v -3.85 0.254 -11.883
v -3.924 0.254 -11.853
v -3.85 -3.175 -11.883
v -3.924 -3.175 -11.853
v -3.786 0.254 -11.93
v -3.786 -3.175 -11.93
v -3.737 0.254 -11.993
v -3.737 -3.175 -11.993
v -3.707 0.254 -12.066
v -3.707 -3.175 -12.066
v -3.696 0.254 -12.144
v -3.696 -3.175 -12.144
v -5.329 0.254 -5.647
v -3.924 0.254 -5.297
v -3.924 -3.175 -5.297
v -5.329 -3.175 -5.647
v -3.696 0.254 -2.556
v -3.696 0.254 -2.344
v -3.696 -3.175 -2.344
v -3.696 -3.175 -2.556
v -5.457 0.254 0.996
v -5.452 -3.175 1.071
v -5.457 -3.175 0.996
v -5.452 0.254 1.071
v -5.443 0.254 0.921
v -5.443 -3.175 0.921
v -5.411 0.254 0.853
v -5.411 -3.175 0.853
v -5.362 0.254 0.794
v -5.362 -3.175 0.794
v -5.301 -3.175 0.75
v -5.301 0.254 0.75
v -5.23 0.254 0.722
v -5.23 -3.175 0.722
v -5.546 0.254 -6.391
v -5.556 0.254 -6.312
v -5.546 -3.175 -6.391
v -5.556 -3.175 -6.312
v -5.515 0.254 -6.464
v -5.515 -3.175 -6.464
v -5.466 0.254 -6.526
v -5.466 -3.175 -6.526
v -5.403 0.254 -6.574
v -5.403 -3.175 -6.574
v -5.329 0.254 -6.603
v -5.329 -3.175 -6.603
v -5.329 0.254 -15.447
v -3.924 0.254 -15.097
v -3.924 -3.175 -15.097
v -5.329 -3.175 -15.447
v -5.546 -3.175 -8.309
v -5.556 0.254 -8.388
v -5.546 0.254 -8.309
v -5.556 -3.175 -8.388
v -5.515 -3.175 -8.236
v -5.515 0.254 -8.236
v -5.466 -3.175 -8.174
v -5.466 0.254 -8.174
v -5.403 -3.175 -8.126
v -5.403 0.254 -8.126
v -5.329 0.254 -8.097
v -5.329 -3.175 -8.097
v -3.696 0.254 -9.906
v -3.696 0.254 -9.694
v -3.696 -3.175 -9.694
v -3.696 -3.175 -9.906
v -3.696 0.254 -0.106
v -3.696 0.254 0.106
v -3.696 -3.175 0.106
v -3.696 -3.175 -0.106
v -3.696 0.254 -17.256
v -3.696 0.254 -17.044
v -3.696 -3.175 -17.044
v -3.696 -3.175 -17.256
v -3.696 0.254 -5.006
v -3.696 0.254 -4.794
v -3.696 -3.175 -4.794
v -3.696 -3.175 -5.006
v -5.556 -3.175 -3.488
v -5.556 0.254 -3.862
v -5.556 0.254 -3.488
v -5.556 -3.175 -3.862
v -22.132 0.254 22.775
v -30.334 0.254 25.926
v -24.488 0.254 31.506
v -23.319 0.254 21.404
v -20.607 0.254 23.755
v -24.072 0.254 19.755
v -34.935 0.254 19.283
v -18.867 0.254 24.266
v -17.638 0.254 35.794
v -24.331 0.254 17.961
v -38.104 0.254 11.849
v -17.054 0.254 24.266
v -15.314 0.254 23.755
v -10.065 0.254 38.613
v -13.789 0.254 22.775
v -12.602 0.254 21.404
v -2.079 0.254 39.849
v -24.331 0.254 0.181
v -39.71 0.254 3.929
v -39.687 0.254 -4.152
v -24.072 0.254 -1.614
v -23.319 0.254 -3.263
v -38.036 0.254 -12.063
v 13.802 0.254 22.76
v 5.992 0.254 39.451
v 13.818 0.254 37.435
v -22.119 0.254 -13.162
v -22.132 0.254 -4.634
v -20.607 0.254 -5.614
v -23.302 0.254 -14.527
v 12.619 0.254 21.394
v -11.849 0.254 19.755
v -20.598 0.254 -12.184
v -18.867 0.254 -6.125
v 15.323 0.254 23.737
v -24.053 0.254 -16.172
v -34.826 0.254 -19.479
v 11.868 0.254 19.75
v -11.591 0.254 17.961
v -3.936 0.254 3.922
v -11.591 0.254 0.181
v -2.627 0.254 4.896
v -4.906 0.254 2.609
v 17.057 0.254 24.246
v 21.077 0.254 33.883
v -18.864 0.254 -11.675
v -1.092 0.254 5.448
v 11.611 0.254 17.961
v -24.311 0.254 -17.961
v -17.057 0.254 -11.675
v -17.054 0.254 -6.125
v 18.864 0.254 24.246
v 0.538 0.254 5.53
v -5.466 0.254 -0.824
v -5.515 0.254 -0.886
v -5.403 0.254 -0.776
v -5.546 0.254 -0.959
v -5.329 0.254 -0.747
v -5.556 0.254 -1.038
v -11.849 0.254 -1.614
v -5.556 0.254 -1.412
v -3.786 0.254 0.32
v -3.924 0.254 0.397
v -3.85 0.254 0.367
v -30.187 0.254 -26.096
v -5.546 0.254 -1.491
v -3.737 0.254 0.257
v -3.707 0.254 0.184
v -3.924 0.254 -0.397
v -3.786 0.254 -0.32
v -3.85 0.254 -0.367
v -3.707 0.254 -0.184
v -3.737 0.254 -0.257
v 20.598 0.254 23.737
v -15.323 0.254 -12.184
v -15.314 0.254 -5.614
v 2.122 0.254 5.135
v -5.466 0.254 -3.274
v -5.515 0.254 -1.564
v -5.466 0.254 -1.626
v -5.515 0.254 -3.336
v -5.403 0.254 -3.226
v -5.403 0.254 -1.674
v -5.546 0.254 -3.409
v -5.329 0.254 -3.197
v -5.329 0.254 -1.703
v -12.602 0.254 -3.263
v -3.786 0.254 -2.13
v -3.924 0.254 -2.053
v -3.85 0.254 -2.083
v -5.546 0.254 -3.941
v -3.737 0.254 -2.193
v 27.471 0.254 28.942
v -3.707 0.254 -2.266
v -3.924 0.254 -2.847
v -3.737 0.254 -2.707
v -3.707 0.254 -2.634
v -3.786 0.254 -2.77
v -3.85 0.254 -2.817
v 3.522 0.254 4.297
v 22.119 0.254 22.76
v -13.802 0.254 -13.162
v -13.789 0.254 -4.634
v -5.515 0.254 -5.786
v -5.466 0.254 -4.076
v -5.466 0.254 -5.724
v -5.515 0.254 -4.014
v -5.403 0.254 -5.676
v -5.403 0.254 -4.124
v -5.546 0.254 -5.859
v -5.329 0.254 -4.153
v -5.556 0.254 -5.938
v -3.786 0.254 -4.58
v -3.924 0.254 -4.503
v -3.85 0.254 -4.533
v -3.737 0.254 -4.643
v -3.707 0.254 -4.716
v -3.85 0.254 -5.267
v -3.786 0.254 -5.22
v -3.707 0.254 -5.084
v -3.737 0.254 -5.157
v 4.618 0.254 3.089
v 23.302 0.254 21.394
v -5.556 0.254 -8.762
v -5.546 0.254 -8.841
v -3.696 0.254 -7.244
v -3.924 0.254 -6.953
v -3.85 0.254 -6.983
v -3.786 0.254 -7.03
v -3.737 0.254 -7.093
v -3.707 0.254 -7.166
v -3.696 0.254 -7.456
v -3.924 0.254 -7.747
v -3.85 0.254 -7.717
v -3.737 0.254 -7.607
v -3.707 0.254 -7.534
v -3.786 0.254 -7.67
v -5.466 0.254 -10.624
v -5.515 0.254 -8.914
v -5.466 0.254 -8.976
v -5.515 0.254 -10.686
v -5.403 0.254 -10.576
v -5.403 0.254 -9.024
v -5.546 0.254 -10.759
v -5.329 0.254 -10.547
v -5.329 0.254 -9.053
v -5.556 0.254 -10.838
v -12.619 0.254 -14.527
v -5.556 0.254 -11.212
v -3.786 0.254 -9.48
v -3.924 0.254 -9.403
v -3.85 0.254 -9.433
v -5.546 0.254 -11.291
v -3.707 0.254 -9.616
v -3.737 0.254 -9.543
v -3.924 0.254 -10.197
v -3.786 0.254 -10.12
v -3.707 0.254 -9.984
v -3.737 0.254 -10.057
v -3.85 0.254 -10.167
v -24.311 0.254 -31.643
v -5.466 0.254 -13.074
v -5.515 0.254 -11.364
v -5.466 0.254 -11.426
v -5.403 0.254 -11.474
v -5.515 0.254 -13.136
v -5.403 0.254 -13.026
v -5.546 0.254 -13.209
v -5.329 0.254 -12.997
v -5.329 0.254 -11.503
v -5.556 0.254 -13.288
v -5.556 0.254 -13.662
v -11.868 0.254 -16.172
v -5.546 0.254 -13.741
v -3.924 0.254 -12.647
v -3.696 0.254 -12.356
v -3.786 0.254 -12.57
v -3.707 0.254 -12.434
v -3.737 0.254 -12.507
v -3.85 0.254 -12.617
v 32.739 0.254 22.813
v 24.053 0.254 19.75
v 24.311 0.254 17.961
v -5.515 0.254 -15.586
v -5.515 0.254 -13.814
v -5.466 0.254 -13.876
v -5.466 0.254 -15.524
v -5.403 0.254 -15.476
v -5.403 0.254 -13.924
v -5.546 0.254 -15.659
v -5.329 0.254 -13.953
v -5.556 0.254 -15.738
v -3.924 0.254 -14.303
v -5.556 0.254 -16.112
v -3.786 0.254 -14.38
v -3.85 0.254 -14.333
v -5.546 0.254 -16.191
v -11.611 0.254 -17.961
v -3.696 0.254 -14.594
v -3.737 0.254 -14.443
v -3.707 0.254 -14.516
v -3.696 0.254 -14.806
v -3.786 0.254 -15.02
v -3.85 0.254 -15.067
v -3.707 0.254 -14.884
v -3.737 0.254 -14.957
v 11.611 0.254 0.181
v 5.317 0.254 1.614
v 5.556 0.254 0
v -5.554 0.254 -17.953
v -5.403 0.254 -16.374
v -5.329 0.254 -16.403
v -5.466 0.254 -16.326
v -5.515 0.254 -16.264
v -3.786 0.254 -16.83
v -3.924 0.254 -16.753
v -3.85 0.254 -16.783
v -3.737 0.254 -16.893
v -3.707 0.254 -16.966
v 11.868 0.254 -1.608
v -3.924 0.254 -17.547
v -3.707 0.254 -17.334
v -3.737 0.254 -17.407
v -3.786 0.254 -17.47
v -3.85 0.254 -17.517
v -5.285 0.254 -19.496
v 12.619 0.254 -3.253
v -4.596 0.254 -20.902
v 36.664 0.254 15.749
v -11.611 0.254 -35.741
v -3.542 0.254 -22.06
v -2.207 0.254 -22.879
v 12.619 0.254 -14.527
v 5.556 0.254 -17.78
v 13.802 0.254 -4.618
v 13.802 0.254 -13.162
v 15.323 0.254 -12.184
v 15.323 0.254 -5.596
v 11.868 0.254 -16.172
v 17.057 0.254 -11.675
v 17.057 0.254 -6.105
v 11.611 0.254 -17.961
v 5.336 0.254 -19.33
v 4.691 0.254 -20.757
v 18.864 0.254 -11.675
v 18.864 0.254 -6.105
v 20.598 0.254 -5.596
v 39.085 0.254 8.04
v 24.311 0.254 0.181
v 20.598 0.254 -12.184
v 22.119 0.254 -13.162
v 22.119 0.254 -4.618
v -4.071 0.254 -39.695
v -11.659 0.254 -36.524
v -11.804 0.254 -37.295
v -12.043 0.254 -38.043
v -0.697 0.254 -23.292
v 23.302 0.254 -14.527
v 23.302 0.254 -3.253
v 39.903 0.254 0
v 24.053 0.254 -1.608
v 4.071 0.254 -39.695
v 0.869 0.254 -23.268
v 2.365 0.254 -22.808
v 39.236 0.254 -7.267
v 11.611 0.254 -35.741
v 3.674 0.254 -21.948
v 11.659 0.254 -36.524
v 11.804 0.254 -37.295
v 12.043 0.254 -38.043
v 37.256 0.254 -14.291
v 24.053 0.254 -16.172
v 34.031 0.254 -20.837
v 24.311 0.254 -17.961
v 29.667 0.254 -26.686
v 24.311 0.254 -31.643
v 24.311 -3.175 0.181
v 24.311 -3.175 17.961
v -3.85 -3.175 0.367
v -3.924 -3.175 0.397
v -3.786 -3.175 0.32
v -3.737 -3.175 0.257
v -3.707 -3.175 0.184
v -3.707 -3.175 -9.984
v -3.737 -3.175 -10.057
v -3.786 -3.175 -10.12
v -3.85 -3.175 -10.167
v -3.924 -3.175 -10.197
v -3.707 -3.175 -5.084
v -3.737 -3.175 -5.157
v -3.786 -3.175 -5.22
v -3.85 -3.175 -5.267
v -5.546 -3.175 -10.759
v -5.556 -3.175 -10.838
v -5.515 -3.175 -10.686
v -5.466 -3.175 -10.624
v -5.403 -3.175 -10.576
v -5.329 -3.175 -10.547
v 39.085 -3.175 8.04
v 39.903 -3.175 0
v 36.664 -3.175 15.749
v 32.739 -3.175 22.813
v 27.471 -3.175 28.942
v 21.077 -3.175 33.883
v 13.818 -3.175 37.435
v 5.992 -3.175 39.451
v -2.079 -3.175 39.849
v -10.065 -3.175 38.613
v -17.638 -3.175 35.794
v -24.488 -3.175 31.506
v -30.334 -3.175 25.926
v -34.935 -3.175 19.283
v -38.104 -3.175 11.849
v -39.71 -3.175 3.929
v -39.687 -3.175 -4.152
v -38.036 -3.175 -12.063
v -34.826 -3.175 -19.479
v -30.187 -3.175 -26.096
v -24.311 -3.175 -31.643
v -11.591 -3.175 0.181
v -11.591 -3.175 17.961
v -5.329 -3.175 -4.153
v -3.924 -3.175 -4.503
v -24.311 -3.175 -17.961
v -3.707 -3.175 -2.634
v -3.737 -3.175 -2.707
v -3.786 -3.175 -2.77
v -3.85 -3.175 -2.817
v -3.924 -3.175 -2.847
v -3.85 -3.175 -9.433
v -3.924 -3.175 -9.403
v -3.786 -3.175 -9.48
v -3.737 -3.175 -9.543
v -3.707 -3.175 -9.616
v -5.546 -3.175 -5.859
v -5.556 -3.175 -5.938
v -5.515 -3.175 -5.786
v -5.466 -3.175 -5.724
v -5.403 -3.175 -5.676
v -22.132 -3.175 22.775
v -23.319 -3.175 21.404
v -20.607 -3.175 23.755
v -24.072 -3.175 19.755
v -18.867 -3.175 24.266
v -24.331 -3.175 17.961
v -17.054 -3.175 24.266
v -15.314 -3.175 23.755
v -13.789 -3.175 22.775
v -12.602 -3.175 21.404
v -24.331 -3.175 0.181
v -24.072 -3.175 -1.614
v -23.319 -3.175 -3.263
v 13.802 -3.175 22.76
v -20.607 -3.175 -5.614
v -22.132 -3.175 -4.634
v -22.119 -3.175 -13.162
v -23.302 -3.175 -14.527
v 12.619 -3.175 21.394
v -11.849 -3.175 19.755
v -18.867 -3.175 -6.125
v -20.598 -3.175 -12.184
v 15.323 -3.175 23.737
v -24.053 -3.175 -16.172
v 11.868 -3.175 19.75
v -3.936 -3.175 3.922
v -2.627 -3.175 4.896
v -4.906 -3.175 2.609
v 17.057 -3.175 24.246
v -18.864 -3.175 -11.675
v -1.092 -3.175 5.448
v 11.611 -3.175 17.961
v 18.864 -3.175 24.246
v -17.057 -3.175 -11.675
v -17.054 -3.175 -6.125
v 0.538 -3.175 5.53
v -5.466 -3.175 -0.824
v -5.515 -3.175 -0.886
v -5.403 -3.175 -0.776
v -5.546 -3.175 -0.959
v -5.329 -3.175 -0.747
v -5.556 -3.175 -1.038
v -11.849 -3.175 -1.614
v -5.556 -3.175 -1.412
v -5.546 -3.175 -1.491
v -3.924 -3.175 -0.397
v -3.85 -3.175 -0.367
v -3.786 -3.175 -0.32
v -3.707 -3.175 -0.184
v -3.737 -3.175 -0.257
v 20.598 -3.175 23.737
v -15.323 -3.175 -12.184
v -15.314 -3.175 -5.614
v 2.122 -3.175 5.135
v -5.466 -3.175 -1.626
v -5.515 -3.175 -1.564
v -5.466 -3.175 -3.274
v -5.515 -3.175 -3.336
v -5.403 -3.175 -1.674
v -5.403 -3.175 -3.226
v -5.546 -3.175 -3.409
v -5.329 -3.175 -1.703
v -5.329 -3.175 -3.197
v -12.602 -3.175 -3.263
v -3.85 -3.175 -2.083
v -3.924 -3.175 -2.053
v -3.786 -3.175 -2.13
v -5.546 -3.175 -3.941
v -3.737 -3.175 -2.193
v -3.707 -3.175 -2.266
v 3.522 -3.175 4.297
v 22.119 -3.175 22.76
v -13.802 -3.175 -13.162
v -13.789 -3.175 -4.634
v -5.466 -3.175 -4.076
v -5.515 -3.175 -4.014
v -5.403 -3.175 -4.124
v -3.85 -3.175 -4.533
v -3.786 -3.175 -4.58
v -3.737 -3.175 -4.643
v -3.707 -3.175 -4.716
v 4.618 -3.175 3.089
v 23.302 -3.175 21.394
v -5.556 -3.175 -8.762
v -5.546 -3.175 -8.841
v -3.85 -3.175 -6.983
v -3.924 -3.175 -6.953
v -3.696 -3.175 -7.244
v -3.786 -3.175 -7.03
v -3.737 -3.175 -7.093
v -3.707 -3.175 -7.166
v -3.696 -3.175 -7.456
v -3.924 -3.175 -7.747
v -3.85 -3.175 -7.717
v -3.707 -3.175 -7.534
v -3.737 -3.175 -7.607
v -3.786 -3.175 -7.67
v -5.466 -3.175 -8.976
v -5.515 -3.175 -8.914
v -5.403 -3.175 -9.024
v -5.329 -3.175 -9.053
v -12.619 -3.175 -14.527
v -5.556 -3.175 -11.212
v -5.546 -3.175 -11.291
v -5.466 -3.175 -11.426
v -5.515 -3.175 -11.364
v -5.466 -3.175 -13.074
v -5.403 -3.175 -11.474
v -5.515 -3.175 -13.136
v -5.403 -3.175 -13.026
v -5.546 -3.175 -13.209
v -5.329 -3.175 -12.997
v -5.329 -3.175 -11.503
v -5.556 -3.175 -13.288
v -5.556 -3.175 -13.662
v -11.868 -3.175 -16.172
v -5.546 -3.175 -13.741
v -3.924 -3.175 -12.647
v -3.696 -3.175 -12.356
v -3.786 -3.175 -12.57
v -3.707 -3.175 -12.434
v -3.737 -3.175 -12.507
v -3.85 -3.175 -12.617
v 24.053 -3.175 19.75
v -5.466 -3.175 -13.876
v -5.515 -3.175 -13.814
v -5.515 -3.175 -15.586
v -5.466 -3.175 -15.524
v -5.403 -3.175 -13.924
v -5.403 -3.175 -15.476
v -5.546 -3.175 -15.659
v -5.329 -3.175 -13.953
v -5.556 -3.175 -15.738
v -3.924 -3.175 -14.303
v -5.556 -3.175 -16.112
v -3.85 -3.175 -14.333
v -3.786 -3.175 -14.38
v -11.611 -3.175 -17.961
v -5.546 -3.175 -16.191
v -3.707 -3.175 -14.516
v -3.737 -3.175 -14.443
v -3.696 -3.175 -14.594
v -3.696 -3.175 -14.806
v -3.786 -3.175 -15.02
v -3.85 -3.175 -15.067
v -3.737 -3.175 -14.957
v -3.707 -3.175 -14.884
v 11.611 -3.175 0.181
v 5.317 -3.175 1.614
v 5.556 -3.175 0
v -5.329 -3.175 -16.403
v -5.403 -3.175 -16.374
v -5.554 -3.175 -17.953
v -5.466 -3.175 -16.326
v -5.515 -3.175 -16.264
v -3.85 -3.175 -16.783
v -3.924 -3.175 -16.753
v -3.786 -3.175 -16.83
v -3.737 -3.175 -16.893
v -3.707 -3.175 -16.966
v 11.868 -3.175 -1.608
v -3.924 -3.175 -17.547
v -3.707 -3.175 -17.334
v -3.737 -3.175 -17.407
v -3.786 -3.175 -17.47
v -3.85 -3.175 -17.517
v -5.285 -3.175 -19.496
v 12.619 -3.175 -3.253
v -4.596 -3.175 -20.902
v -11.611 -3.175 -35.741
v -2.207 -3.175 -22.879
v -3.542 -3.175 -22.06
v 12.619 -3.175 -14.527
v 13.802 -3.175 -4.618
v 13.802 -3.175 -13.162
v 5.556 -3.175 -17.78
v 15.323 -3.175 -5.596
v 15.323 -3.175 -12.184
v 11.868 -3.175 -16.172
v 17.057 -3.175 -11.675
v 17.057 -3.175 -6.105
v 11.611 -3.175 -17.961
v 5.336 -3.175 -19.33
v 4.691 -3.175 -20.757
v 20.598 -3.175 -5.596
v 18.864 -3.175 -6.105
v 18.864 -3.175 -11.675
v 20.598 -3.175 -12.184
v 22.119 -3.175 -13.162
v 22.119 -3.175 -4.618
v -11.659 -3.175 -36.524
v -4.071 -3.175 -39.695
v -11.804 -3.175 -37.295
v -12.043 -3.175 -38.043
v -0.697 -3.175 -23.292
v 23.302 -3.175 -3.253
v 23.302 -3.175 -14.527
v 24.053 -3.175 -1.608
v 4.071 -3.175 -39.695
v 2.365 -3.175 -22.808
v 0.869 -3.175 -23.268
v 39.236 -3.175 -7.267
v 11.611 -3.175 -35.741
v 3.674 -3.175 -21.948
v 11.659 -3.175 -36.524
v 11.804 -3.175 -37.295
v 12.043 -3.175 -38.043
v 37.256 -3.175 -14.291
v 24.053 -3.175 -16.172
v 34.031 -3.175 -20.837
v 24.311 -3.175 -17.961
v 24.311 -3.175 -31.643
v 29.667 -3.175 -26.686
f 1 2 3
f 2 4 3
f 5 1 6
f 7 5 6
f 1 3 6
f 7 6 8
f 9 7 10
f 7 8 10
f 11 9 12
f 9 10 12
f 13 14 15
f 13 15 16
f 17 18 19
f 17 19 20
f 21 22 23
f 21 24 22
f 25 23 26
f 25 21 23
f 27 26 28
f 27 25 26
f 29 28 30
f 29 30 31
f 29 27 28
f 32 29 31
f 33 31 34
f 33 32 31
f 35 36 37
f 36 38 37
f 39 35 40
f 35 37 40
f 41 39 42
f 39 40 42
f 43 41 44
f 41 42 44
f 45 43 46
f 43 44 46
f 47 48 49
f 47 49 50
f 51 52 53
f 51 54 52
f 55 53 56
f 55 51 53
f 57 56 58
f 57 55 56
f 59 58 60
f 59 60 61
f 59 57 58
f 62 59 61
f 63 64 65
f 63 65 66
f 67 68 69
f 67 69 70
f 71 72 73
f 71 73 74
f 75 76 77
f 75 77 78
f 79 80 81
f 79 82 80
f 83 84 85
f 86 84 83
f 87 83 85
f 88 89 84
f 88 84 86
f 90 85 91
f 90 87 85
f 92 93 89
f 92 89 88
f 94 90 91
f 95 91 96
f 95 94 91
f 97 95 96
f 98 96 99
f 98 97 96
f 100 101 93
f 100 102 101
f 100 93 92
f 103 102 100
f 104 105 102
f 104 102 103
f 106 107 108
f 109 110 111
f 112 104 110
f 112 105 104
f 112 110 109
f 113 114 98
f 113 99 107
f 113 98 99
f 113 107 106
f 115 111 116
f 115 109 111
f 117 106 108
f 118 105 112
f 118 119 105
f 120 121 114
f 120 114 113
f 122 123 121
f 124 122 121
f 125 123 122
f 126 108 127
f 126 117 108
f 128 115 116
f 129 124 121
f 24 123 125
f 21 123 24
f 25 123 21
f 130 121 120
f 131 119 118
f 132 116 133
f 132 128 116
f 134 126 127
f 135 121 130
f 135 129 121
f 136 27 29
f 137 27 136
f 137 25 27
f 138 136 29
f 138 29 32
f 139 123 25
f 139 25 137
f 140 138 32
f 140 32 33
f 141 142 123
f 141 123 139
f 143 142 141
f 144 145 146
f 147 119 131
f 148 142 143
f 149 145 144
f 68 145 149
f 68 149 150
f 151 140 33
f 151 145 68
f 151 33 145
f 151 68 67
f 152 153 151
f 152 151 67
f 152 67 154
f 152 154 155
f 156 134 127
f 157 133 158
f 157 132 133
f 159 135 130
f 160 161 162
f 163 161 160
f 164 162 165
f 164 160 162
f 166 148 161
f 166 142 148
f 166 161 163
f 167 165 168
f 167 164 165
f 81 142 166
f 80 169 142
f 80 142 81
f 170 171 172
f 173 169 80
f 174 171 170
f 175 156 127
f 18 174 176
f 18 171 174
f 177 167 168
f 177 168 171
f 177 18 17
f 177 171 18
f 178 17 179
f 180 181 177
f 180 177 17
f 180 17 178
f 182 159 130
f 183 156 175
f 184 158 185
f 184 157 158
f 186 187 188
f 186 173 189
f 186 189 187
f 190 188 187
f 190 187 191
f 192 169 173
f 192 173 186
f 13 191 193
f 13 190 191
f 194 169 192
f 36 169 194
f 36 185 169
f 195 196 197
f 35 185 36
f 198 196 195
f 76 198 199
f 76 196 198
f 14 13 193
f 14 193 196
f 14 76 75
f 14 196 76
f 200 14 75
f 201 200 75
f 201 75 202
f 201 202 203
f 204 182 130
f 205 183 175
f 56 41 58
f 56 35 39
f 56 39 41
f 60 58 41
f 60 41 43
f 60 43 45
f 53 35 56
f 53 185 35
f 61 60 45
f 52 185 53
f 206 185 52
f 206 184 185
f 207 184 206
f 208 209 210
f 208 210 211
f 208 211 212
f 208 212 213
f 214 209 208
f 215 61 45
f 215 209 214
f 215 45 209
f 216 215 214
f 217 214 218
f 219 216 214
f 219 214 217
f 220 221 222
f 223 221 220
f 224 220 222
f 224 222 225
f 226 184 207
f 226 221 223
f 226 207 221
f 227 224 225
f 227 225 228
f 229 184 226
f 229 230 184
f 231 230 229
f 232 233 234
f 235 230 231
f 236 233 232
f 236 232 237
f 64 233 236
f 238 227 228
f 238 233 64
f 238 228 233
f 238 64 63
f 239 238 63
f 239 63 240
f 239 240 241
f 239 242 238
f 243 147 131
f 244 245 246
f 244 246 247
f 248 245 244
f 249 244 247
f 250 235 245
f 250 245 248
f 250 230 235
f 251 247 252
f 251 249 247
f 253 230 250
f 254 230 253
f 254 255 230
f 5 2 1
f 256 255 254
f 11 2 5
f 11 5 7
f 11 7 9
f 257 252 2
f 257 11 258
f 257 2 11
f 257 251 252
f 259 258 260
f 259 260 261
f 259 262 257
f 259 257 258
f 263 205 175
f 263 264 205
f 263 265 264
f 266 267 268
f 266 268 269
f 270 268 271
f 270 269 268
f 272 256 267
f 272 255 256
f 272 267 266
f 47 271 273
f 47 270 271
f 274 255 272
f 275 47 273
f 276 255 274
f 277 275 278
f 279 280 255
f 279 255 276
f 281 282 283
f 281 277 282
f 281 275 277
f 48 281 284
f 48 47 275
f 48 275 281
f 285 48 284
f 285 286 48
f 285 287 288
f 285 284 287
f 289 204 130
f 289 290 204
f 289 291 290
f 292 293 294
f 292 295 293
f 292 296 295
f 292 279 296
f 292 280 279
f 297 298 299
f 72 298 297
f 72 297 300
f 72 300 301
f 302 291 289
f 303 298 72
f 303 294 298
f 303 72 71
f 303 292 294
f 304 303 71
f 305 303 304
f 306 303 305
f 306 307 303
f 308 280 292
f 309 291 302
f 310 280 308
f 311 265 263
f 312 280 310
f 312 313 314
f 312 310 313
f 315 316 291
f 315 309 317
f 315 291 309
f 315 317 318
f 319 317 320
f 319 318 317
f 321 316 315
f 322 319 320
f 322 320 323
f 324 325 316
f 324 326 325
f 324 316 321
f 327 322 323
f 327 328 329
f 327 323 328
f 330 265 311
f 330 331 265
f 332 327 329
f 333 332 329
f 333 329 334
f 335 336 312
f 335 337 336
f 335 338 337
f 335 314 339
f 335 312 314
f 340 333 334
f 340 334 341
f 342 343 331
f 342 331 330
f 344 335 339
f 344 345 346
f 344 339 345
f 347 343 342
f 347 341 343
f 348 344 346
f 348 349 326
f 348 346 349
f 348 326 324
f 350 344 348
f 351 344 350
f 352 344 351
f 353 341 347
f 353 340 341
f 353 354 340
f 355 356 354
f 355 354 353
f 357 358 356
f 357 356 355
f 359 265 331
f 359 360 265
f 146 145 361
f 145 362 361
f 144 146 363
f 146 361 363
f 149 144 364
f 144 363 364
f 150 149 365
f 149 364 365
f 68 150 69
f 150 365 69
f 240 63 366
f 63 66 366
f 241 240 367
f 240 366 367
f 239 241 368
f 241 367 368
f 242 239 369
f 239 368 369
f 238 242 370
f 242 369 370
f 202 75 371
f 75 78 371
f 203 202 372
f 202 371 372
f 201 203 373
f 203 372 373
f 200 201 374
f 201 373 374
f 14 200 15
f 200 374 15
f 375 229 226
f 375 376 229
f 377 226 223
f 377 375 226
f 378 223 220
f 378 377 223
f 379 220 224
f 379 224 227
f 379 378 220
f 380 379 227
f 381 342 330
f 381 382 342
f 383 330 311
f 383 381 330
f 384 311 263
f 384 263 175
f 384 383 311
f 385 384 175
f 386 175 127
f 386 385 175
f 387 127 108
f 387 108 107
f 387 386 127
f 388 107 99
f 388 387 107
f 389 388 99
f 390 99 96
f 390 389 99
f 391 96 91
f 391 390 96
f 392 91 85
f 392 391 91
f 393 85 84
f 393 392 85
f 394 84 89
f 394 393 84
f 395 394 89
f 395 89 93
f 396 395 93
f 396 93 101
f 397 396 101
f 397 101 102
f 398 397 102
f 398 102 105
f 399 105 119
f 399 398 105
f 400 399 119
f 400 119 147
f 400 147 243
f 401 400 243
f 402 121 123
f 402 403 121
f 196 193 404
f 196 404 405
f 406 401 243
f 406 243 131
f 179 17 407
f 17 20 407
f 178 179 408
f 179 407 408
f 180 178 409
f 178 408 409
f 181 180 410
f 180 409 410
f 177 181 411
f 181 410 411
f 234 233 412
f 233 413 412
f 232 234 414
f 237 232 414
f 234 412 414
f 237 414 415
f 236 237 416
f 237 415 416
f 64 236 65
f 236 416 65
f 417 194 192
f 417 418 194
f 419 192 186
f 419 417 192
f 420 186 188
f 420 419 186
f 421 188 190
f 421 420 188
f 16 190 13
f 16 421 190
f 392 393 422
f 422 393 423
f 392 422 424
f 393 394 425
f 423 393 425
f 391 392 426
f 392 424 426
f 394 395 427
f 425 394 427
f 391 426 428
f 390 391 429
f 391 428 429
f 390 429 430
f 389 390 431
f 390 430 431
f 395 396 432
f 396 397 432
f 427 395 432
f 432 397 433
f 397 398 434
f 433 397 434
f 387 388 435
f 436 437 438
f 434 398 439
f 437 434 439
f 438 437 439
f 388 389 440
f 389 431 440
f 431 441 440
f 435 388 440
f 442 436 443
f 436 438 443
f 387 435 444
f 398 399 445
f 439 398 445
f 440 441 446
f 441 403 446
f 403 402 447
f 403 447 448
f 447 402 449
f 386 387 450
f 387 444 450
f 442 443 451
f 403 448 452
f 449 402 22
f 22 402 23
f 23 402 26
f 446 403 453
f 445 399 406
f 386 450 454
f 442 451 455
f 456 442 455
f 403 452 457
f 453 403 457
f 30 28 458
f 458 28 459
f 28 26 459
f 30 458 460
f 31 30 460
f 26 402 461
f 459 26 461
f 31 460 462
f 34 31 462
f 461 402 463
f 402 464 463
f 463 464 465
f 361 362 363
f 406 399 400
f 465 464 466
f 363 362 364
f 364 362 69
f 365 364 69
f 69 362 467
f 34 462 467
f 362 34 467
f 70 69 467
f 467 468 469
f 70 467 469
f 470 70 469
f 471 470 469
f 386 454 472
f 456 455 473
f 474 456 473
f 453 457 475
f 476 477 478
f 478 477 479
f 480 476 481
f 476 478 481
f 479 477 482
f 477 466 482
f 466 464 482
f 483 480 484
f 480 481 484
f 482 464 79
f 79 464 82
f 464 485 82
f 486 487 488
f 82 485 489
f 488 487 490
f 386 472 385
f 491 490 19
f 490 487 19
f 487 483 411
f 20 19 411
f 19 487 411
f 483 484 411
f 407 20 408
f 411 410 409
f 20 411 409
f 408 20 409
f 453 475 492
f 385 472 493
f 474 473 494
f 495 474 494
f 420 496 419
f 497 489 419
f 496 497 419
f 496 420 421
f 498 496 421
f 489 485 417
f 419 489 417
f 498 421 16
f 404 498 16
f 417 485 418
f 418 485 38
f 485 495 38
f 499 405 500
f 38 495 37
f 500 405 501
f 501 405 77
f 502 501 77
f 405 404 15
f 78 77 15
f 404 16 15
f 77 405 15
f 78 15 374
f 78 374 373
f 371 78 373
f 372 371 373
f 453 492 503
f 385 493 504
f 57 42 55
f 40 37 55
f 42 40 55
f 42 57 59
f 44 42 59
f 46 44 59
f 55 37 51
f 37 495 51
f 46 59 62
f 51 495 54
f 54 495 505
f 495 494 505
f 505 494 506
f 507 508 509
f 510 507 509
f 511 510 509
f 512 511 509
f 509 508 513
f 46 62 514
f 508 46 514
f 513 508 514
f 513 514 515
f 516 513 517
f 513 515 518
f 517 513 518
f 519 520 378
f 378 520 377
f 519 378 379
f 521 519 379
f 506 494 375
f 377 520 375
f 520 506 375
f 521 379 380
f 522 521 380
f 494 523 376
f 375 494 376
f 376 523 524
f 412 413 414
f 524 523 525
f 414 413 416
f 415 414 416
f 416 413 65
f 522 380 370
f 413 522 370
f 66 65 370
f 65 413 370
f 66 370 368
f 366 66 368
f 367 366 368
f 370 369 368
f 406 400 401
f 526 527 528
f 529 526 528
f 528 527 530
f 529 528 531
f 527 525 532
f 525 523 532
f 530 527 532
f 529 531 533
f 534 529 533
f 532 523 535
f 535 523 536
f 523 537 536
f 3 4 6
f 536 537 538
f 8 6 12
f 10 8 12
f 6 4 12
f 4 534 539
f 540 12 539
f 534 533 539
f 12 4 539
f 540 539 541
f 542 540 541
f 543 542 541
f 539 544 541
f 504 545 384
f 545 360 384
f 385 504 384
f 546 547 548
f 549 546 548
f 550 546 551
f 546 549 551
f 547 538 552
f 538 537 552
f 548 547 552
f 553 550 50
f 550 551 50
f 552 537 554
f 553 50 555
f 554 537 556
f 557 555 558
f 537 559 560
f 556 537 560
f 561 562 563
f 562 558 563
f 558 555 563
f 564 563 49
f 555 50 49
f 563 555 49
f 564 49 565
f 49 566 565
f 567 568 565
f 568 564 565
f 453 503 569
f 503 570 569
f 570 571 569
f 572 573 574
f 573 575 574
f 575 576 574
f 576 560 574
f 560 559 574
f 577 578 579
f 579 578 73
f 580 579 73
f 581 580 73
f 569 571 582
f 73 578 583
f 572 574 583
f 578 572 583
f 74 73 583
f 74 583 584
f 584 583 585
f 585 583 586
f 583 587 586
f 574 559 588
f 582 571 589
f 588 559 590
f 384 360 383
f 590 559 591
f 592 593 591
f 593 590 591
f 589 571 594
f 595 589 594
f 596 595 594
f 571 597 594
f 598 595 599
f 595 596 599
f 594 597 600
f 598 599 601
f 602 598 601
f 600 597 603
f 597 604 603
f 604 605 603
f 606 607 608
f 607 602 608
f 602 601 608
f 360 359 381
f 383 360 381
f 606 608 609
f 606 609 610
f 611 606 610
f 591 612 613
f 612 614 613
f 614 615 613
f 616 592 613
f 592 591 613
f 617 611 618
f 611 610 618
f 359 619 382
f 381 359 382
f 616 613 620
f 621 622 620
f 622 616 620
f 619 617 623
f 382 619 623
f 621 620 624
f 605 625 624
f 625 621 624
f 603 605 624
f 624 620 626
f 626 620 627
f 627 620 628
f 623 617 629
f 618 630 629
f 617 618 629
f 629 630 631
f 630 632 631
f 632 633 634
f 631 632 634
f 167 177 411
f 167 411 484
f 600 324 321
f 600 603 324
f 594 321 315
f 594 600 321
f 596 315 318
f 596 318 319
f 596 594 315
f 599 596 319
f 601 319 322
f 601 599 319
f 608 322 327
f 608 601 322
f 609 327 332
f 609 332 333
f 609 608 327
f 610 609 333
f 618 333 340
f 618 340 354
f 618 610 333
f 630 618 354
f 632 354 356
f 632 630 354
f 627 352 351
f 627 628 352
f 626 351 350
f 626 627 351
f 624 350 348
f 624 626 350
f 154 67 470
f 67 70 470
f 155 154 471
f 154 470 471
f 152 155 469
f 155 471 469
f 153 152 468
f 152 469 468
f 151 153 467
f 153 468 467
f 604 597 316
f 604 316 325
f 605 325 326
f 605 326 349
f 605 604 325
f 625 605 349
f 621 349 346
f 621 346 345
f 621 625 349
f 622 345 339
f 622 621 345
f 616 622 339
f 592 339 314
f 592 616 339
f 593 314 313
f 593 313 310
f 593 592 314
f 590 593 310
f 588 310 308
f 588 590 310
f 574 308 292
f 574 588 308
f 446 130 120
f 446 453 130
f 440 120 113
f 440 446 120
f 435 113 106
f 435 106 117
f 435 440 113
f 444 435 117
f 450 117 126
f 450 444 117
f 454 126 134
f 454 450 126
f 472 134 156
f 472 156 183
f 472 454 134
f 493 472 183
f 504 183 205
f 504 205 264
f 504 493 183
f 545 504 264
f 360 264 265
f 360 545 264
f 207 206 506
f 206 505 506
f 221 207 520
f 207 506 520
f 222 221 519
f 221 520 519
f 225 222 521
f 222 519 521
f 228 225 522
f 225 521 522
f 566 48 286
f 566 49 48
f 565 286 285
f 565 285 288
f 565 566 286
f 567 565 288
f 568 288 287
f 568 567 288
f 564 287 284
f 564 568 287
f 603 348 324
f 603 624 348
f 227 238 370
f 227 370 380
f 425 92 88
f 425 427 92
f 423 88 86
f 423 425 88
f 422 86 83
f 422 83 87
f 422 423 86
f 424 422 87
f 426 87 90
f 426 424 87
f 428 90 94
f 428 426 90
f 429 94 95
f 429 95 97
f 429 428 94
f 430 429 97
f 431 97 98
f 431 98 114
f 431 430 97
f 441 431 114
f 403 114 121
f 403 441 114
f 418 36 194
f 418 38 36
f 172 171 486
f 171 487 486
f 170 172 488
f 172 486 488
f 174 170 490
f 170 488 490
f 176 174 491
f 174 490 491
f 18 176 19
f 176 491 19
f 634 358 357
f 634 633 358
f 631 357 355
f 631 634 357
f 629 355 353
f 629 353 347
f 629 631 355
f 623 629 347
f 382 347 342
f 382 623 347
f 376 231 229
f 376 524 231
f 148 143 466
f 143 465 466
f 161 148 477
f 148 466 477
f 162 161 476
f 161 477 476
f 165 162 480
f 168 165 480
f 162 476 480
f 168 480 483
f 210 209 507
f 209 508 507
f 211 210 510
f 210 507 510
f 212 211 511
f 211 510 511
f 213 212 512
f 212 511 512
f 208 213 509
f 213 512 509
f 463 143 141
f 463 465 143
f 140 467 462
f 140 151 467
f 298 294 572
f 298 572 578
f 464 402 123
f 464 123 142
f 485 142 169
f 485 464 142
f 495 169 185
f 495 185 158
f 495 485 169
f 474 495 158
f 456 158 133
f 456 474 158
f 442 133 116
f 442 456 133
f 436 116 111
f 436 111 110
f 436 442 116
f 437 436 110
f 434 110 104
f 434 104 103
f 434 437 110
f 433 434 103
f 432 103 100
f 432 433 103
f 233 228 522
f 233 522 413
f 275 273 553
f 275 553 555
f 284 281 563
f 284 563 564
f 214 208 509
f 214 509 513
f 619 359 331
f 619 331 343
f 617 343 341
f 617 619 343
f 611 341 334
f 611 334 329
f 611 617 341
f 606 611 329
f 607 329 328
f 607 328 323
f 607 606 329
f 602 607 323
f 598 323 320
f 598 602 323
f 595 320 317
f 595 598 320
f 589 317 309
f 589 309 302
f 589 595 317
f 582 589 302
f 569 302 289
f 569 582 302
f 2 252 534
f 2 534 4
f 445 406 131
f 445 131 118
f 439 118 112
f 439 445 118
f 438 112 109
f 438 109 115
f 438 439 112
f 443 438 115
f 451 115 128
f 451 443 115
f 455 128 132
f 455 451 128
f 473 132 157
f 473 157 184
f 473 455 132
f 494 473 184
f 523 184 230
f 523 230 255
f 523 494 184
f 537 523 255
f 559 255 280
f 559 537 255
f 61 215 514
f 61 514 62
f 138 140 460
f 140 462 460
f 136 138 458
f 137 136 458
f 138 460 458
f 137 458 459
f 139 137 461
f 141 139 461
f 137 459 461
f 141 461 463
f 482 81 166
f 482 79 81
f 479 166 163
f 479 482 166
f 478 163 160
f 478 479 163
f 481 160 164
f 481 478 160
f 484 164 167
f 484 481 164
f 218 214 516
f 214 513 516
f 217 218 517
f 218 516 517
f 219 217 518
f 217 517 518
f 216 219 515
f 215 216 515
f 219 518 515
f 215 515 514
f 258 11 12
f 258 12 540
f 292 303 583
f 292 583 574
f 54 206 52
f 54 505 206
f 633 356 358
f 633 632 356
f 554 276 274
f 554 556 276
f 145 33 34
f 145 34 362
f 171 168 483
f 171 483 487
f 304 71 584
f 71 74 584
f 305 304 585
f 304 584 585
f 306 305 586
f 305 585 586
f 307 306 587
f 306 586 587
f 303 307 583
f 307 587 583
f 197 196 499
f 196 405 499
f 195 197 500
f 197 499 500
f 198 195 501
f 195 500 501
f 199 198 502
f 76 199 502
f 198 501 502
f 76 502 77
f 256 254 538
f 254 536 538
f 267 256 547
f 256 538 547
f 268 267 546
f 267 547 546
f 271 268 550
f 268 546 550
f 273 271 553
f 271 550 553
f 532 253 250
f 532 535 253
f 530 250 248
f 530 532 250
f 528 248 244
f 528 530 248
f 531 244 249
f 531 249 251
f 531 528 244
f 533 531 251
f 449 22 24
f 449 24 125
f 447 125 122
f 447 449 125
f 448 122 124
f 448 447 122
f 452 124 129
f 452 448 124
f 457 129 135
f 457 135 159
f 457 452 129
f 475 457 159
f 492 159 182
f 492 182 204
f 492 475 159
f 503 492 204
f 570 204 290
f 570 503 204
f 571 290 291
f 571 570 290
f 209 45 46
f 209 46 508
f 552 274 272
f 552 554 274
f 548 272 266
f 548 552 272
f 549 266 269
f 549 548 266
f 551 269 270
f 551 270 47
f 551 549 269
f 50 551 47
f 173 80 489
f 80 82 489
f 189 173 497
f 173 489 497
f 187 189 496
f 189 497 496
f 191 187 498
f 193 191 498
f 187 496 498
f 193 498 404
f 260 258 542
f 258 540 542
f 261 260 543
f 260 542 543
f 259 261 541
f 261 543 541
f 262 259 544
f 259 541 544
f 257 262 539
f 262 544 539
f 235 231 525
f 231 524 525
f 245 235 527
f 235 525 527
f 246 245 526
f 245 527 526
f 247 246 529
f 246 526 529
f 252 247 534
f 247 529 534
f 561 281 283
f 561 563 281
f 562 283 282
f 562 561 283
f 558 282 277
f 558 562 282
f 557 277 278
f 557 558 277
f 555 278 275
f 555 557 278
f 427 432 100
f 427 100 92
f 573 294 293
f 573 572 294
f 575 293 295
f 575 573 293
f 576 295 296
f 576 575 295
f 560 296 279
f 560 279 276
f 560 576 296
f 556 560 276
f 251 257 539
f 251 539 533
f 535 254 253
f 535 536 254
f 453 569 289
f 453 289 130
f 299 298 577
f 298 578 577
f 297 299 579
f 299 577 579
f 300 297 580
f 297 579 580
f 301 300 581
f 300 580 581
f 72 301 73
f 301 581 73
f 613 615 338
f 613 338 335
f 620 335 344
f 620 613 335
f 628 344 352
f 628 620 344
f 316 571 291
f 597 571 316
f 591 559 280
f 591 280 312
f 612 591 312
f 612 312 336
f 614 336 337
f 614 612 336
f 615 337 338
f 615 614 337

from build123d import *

# Parameters (mm, degrees)
BOSS_EXTRUDE1_DEPTH      = 3.175
BOSS_EXTRUDE1_DEPTH_BACK = 0.254
BOSS_EXTRUDE2_DEPTH      = 3.429
LPATTERN1_COUNT          = 8
LPATTERN1_PITCH          = 2.45
FILLET1_R                = 0.3


with BuildPart() as part:
    # Sketch3 → Boss-Extrude1 (new body, two sides)
    with BuildSketch(Plane.XZ) as boss_extrude1_sk:
        with BuildLine():
            ThreePointArc((39.9034, 0), (-17.63815803, 35.793528925), (-24.310512242, -31.643013859))
            Line((-24.310512242, -31.643013859), (-24.310512242, -17.960512242))
            ThreePointArc((-24.310512242, -17.960512242), (-17.960512242, -11.610512242), (-11.610512242, -17.960512242))
            Line((-11.610512242, -17.960512242), (-11.610512242, -35.740512242))
            ThreePointArc((-11.610512242, -35.740512242), (-11.71946636, -36.911770666), (-12.042589815, -38.042835884))
            ThreePointArc((-12.042589815, -38.042835884), (0, -39.9034), (12.042589815, -38.042835884))
            ThreePointArc((12.042589815, -38.042835884), (11.71946636, -36.911770666), (11.610512242, -35.740512242))
            Line((11.610512242, -35.740512242), (11.610512242, -17.960512242))
            ThreePointArc((11.610512242, -17.960512242), (17.960512242, -11.610512242), (24.310512242, -17.960512242))
            Line((24.310512242, -17.960512242), (24.310512242, -31.643013859))
            ThreePointArc((24.310512242, -31.643013859), (35.793528925, -17.63815803), (39.9034, 0))
        make_face()
        with BuildLine():
            ThreePointArc((-5.55625, 0), (0, 5.55625), (5.55625, 0))
            Line((5.55625, 0), (5.55625, -17.78))
            ThreePointArc((5.55625, -17.78), (0, -23.33625), (-5.55625, -17.78))
            Line((-5.55625, -17.78), (-5.55625, 0))
        make_face(mode=Mode.SUBTRACT)
        with BuildLine():
            ThreePointArc((-11.590512242, 0.180512242), (-17.960512242, -6.189487758), (-24.330512242, 0.180512242))
            Line((-24.330512242, 0.180512242), (-24.330512242, 17.960512242))
            ThreePointArc((-24.330512242, 17.960512242), (-17.960512242, 24.330512242), (-11.590512242, 17.960512242))
            Line((-11.590512242, 17.960512242), (-11.590512242, 0.180512242))
        make_face(mode=Mode.SUBTRACT)
        with BuildLine():
            ThreePointArc((24.310512242, 0.180512242), (17.960512242, -6.169487758), (11.610512242, 0.180512242))
            Line((11.610512242, 0.180512242), (11.610512242, 17.960512242))
            ThreePointArc((11.610512242, 17.960512242), (17.960512242, 24.310512242), (24.310512242, 17.960512242))
            Line((24.310512242, 17.960512242), (24.310512242, 0.180512242))
        make_face(mode=Mode.SUBTRACT)
    extrude(amount=BOSS_EXTRUDE1_DEPTH)
    extrude(boss_extrude1_sk.sketch, amount=-BOSS_EXTRUDE1_DEPTH_BACK)

    # Sketch4 → Boss-Extrude2 (add)
    with BuildSketch(Plane(origin=(0, 0.254, 0), x_dir=(1, 0, 0), z_dir=(0, 1, 0))):
        Polygon((-5.55625, -0.803750085), (-3.69625, -0.34), (-3.69625, 0.34), (-5.55625, 0.803750085), align=None)
    boss_extrude2 = extrude(amount=-BOSS_EXTRUDE2_DEPTH)

    # LPattern1: Boss-Extrude2 ×8
    with Locations(*[(0, 0, -i * LPATTERN1_PITCH) for i in range(1, LPATTERN1_COUNT)]):
        add(boss_extrude2)

    # Fillet1
    fillet1_edges = [part.edges().sort_by_distance(p)[0] for p in [
        (-3.69625, -1.4605, 0.34),
        (-5.55625, -1.4605, -0.803750085),
        (-3.69625, -1.4605, -0.34),
        (-5.499846219, -1.4605, 0.789687043),
        (-5.55625, -1.4605, -1.646249915),
        (-5.55625, -1.4605, -3.253750085),
        (-3.69625, -1.4605, -2.79),
        (-3.69625, -1.4605, -2.11),
        (-5.55625, -1.4605, -4.096249915),
        (-5.55625, -1.4605, -5.703750085),
        (-3.69625, -1.4605, -5.24),
        (-3.69625, -1.4605, -4.56),
        (-5.55625, -1.4605, -6.546249915),
        (-5.55625, -1.4605, -8.153750085),
        (-3.69625, -1.4605, -7.69),
        (-3.69625, -1.4605, -7.01),
        (-5.55625, -1.4605, -8.996249915),
        (-5.55625, -1.4605, -10.603750085),
        (-3.69625, -1.4605, -10.14),
        (-3.69625, -1.4605, -9.46),
        (-5.55625, -1.4605, -11.446249915),
        (-5.55625, -1.4605, -13.053750085),
        (-3.69625, -1.4605, -12.59),
        (-3.69625, -1.4605, -11.91),
        (-5.55625, -1.4605, -13.896249915),
        (-5.55625, -1.4605, -15.503750085),
        (-3.69625, -1.4605, -15.04),
        (-3.69625, -1.4605, -14.36),
        (-5.55625, -1.4605, -16.346249915),
        (-3.69625, -1.4605, -17.49),
        (-3.69625, -1.4605, -16.81),
    ]]
    fillet(fillet1_edges, radius=FILLET1_R)


solid = part.part
